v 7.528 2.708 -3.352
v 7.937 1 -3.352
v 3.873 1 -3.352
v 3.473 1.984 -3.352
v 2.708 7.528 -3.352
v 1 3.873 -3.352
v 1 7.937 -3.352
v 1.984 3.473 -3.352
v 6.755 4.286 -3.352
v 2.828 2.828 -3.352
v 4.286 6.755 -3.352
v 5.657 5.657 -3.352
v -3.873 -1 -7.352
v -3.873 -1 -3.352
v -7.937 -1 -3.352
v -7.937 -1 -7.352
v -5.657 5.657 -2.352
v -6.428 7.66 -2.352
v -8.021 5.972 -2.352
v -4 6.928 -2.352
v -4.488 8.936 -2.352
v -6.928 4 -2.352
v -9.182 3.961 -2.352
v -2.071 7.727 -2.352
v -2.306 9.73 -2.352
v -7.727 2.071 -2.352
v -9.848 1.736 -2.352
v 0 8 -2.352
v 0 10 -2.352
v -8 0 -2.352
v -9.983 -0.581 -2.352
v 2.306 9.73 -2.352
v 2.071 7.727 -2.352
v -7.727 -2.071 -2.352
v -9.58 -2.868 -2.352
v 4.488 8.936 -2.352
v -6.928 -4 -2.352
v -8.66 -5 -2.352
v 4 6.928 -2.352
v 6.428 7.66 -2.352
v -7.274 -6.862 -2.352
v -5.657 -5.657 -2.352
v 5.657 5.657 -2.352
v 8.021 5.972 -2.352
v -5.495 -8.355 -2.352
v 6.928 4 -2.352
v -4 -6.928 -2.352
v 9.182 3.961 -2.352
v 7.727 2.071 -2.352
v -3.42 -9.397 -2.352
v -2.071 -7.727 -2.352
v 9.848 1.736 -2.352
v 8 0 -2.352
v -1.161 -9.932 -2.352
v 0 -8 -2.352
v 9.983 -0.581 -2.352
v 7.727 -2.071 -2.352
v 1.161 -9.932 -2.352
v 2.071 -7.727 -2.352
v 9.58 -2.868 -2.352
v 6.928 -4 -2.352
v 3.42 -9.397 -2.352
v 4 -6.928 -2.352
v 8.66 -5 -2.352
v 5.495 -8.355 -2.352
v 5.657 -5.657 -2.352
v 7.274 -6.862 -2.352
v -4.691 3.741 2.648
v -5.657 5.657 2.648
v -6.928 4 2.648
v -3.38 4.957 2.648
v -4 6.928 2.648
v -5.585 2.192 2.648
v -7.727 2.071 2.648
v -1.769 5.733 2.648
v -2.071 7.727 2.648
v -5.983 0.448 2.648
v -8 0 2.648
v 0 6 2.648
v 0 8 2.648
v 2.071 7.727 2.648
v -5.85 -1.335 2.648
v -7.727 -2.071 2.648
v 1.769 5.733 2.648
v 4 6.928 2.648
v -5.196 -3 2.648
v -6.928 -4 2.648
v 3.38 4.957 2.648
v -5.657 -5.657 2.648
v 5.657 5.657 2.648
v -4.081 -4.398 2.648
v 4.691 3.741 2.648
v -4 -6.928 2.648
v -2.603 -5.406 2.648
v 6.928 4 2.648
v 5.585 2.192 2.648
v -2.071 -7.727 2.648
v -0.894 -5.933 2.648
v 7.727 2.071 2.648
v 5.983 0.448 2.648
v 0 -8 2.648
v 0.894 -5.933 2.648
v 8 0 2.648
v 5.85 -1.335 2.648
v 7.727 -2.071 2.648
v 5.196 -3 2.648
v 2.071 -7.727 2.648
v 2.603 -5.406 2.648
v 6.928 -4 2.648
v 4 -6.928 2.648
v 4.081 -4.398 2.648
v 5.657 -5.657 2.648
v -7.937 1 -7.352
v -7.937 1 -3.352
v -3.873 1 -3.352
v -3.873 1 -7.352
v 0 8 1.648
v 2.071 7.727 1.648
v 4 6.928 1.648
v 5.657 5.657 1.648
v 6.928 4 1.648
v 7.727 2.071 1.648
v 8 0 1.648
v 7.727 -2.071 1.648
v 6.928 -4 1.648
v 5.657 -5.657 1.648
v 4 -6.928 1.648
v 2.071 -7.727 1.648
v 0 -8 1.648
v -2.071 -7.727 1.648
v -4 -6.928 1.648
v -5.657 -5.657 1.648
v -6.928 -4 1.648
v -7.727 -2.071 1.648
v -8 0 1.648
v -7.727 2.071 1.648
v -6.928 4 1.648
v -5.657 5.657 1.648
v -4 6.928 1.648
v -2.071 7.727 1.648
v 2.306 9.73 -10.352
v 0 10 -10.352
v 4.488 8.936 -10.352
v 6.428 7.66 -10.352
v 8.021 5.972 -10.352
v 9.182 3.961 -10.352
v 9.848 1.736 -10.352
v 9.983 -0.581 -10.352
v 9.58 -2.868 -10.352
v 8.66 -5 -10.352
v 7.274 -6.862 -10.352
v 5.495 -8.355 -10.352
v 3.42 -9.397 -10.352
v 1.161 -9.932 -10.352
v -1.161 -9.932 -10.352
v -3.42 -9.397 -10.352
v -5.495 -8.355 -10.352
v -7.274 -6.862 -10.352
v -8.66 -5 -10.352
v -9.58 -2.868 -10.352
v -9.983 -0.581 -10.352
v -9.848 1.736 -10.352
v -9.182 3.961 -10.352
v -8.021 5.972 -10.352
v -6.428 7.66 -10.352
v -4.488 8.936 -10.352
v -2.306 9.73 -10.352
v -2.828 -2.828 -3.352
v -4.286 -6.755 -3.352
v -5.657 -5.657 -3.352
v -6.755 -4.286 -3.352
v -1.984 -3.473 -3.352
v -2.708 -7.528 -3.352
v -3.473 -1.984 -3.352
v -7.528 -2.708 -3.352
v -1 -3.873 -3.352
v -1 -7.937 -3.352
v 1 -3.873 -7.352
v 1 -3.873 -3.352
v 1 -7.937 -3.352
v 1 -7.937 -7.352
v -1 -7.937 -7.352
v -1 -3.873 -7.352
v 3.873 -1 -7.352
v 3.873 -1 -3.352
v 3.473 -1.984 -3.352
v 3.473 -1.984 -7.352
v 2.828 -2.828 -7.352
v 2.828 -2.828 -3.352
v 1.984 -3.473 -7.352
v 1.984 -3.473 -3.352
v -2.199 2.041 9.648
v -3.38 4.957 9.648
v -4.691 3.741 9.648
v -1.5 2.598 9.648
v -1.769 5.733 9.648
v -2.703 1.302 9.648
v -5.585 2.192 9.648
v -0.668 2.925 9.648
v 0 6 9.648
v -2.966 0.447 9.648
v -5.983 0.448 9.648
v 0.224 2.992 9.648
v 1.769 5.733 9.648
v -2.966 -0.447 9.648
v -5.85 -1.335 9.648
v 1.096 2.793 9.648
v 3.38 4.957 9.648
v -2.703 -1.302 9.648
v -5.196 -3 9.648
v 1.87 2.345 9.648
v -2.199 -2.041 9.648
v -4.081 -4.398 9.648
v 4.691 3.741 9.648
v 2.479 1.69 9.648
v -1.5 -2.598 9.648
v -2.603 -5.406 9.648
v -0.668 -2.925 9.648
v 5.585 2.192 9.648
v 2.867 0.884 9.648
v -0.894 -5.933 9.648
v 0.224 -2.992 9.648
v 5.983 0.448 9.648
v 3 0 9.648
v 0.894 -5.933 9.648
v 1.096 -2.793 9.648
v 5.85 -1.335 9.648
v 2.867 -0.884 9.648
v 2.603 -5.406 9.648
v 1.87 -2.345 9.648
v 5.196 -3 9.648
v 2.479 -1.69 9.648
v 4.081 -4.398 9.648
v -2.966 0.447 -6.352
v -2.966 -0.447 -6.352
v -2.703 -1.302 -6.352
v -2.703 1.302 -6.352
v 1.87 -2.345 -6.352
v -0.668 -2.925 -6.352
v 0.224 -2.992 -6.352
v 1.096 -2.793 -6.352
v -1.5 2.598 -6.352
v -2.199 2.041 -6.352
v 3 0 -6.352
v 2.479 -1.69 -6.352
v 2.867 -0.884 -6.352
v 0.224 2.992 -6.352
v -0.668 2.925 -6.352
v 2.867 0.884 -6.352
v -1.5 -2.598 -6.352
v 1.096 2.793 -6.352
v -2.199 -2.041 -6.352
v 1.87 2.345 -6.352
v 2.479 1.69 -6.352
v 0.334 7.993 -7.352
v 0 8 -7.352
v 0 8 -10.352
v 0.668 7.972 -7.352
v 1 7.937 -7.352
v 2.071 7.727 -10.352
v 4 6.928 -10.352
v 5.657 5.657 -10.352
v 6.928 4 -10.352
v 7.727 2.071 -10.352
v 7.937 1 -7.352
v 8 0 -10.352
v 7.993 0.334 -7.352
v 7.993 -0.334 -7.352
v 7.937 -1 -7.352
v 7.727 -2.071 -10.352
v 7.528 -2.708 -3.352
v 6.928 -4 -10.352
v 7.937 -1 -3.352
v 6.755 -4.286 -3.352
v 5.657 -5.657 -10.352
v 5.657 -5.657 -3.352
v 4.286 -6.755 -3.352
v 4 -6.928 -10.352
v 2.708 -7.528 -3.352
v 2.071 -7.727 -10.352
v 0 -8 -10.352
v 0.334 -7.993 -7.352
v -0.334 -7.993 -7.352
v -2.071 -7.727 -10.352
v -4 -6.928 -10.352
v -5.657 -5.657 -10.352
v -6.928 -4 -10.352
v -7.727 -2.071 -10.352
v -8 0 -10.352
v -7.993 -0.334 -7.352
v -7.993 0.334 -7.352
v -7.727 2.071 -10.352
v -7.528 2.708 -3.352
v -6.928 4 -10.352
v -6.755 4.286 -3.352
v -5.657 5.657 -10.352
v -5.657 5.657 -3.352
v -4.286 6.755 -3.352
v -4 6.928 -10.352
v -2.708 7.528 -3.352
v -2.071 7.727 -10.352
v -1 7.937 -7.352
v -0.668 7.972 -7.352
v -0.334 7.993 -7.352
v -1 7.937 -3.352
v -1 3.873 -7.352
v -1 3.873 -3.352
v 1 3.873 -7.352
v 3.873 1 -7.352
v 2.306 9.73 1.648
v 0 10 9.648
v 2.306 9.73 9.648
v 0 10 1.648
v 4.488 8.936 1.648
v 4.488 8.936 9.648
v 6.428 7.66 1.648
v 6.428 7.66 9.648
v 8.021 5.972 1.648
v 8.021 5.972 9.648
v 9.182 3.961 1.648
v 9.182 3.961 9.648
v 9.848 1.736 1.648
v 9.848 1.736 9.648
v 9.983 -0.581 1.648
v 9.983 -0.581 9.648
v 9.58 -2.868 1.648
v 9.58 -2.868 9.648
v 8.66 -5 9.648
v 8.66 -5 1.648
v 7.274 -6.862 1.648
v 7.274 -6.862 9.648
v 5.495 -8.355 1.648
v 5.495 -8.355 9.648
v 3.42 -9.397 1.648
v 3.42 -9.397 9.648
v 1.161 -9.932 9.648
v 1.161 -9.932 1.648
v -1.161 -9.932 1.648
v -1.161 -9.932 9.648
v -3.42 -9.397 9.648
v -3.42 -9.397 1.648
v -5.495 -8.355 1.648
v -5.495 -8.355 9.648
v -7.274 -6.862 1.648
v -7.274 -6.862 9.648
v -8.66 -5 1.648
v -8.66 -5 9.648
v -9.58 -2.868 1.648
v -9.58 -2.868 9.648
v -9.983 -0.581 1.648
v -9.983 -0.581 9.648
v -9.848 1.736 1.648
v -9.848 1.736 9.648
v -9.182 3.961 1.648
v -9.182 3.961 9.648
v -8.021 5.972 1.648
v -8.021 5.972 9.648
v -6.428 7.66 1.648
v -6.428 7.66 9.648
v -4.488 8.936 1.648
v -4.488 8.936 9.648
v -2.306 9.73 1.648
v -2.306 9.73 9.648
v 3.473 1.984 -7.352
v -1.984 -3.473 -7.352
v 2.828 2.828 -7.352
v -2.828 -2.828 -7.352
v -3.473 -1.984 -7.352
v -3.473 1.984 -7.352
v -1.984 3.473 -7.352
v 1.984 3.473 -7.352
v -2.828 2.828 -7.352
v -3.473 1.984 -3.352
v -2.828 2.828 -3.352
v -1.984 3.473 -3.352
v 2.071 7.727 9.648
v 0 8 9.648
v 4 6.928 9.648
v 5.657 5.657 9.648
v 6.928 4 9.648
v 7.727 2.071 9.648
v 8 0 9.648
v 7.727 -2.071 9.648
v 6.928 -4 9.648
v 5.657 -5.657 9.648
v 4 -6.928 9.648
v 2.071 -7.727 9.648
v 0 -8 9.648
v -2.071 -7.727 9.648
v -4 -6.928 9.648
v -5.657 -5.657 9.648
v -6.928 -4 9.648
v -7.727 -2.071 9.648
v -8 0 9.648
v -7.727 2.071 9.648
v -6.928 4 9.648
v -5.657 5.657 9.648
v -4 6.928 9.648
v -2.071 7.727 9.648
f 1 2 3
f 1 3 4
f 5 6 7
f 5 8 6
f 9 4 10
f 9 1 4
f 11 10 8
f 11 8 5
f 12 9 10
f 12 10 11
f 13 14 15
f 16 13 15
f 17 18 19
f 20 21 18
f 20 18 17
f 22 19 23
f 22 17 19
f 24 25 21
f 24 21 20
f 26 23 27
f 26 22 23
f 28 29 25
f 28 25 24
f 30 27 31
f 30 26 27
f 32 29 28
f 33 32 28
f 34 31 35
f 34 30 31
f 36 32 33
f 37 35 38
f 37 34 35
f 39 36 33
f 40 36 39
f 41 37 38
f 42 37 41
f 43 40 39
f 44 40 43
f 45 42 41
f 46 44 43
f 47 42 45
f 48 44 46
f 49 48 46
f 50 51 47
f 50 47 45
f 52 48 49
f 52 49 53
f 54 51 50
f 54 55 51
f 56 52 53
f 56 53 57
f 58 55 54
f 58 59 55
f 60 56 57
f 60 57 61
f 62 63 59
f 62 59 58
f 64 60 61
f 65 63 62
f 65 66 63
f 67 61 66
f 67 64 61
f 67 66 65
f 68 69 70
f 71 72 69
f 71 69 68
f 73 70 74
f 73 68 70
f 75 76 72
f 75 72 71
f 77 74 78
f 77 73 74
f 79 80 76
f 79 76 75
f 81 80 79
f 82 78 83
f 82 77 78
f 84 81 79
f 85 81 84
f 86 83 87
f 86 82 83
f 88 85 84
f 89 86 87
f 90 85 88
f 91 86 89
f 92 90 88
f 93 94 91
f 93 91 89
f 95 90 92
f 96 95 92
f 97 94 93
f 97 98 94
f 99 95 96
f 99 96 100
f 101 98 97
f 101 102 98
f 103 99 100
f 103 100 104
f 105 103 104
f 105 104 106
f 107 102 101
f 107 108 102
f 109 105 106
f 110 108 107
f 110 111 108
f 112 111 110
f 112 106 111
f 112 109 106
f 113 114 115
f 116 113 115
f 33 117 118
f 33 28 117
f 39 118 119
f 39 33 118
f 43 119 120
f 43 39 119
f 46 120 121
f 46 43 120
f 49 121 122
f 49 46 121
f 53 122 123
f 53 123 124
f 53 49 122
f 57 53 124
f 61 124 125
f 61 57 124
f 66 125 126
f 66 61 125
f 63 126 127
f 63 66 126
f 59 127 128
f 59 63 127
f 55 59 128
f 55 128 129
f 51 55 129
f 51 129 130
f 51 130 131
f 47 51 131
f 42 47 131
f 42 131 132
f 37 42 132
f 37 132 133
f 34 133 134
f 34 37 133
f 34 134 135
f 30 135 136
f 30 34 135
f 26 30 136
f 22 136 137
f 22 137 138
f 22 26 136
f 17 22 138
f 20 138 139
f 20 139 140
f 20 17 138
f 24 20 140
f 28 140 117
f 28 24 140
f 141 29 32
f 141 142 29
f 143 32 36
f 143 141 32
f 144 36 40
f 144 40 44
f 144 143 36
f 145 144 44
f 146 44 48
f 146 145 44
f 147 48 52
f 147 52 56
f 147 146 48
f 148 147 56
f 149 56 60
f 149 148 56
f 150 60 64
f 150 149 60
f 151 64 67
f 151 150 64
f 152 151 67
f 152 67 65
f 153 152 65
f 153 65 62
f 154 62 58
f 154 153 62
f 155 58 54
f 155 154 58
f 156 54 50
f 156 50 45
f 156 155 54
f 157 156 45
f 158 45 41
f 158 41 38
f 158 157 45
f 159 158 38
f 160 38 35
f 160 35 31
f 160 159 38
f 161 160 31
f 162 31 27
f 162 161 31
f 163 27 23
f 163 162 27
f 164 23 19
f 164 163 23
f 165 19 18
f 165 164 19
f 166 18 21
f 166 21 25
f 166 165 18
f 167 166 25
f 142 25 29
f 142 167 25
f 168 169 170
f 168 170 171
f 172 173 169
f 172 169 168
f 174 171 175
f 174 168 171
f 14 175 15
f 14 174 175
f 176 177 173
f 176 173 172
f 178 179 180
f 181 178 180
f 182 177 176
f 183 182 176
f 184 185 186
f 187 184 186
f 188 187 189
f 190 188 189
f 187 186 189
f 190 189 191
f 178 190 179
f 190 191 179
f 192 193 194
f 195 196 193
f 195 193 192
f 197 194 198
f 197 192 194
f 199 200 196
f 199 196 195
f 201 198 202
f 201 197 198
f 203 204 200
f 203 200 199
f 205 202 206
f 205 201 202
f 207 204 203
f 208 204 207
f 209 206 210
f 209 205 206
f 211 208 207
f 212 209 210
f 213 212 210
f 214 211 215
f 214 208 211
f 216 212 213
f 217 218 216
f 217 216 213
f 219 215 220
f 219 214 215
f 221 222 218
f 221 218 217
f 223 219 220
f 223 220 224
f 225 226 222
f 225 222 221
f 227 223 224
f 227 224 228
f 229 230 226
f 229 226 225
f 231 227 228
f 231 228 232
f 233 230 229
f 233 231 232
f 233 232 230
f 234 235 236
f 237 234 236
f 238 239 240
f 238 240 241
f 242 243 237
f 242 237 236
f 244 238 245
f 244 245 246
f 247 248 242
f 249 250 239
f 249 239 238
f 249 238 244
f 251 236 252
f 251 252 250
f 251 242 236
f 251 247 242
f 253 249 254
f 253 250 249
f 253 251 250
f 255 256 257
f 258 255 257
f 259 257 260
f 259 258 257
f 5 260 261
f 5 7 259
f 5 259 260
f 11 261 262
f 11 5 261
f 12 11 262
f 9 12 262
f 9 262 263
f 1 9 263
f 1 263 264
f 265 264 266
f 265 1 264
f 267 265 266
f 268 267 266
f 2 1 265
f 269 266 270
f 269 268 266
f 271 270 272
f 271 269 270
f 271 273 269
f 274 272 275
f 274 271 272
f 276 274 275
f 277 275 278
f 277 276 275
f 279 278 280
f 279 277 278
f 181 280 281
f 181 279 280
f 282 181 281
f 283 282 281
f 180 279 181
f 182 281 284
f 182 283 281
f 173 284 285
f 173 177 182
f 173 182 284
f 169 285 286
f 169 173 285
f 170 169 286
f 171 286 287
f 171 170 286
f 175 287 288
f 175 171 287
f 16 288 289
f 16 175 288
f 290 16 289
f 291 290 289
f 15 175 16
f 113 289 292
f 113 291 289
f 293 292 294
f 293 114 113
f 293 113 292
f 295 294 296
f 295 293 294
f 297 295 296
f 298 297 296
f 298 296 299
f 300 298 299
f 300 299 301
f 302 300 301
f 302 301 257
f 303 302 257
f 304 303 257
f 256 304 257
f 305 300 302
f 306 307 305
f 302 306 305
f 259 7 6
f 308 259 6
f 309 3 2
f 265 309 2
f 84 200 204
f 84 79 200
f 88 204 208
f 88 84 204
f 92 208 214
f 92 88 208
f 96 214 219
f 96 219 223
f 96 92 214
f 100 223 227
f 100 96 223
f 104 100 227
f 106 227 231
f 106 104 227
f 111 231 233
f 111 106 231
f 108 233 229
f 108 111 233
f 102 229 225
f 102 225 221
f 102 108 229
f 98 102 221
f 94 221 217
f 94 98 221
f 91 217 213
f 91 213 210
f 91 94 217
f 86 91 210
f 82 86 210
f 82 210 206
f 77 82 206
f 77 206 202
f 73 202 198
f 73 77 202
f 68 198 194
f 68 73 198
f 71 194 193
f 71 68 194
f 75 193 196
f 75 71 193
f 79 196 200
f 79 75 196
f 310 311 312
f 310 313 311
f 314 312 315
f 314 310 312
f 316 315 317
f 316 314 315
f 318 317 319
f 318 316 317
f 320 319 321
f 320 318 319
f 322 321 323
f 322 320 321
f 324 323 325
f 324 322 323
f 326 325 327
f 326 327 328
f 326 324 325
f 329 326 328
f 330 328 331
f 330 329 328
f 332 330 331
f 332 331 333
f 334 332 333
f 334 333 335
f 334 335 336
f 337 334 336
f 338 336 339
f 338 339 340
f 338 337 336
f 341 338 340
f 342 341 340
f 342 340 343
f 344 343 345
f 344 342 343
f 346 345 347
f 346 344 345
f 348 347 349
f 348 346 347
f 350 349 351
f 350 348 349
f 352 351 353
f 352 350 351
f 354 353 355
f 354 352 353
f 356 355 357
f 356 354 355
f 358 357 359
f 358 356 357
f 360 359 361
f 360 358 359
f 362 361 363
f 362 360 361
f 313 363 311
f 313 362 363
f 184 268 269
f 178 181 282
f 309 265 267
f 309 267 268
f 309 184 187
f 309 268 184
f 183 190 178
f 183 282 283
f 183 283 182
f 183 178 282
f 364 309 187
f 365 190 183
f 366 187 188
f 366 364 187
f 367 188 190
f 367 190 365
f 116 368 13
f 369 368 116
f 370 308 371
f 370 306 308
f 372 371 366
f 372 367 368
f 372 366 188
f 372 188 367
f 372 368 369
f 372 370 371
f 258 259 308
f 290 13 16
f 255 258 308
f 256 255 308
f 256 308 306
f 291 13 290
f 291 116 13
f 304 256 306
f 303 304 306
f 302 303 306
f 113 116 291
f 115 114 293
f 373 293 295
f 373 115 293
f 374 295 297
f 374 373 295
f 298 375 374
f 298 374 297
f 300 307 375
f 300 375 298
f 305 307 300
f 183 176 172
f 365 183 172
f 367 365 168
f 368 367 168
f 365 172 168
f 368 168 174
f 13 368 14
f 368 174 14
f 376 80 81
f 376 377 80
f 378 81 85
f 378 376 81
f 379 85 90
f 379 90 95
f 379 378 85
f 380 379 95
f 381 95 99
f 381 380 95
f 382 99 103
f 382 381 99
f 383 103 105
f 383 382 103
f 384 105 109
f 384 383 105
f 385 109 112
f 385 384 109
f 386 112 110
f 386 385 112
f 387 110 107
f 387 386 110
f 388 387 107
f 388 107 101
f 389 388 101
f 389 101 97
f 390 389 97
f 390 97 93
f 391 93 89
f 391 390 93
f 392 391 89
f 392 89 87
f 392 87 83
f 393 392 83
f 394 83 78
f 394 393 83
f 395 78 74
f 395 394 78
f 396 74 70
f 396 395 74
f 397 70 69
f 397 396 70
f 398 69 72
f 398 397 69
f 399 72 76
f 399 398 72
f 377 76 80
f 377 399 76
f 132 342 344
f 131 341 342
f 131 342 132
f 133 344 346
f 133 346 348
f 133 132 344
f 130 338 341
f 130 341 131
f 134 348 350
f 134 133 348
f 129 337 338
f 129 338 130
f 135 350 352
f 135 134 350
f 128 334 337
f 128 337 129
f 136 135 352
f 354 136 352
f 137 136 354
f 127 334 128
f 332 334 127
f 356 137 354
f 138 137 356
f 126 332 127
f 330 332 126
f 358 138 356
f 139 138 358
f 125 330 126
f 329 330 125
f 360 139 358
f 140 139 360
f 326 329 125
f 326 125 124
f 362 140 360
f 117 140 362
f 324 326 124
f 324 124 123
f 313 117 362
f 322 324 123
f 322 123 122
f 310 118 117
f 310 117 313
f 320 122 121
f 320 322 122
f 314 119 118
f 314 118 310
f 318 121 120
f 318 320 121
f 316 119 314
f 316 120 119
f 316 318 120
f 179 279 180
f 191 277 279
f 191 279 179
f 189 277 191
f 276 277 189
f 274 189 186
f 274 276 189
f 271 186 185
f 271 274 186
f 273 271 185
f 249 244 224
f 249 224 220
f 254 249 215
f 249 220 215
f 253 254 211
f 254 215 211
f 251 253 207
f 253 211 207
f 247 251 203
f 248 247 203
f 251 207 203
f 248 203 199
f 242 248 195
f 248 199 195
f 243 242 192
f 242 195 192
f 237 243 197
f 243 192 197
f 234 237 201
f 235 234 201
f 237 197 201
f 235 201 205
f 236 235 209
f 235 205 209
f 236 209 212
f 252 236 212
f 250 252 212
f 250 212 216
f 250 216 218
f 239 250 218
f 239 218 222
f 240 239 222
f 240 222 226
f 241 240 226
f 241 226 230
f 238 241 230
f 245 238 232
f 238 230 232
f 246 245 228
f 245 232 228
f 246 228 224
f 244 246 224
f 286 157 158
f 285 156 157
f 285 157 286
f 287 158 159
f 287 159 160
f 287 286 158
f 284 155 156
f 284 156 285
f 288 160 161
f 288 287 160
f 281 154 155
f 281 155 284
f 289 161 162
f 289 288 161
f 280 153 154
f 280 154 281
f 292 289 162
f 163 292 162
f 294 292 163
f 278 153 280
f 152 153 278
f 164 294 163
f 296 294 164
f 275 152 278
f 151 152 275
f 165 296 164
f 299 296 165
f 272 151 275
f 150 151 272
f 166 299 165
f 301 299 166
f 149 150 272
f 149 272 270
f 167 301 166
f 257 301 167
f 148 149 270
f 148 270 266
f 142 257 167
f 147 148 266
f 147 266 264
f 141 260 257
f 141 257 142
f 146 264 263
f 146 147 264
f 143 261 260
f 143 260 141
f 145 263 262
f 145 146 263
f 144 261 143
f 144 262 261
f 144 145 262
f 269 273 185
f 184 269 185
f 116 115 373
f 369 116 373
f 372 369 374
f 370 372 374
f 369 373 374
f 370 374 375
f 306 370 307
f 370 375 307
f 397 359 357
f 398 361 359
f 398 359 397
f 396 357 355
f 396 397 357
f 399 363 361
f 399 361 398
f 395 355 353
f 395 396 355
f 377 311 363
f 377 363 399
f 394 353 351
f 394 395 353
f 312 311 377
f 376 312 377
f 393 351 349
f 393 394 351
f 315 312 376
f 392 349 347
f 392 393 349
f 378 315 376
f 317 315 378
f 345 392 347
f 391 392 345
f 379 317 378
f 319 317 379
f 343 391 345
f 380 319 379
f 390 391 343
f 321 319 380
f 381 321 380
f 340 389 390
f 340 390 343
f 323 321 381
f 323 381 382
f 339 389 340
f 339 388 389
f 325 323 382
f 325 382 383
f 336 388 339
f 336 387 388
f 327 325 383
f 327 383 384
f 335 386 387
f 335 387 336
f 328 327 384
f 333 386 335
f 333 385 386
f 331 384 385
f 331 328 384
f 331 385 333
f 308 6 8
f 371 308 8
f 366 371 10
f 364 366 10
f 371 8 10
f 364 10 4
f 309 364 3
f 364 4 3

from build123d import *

# Parameters (mm, degrees)
BOSS_EXTRUDE1_DEPTH = 2
SKETCH4_R           = 1.5
CUT_EXTRUDE1_DEPTH  = 8
SCALE1_SCALE        = 2


with BuildPart() as part:
    # Sketch2 → Revolve1 (revolve)
    with BuildSketch(Plane(origin=(0, 0, 0), x_dir=(0, 0, -1), z_dir=(1, 0, 0))):
        Polygon((0, 0), (-5, 0), (-5, 3), (-1.5, 3), (-1.5, 4), (-5, 4), (-5, 5), (-1, 5), (-1, 4), (1, 4), (1, 5), (5, 5), (5, 4), (1.5, 4), (1.5, 0), align=None)
    revolve(axis=Axis((0, 0, 7.547271319), (0, 0, -1)))

    # Sketch3 → Boss-Extrude1 (add)
    with BuildSketch(Plane(origin=(0, 0, -1.5), x_dir=(-1, 0, 0), z_dir=(0, 0, -1))):
        with BuildLine():
            Line((0.5, 1.936491673), (0.5, 3.968626967))
            ThreePointArc((0.5, 3.968626967), (0, 4), (-0.5, 3.968626967))
            Line((-0.5, 3.968626967), (-0.5, 1.936491673))
            ThreePointArc((-0.5, 1.936491673), (-1.414213562, 1.414213562), (-1.936491673, 0.5))
            Line((-1.936491673, 0.5), (-3.968626967, 0.5))
            ThreePointArc((-3.968626967, 0.5), (-4, 0), (-3.968626967, -0.5))
            Line((-3.968626967, -0.5), (-1.936491673, -0.5))
            ThreePointArc((-1.936491673, -0.5), (-1.414213562, -1.414213562), (-0.5, -1.936491673))
            Line((-0.5, -1.936491673), (-0.5, -3.968626967))
            ThreePointArc((-0.5, -3.968626967), (0, -4), (0.5, -3.968626967))
            Line((0.5, -3.968626967), (0.5, -1.936491673))
            ThreePointArc((0.5, -1.936491673), (1.414213562, -1.414213562), (1.936491673, -0.5))
            Line((1.936491673, -0.5), (3.968626967, -0.5))
            ThreePointArc((3.968626967, -0.5), (4, 0), (3.968626967, 0.5))
            Line((3.968626967, 0.5), (1.936491673, 0.5))
            ThreePointArc((1.936491673, 0.5), (1.414213562, 1.414213562), (0.5, 1.936491673))
        make_face()
    extrude(amount=BOSS_EXTRUDE1_DEPTH)

    # Sketch4 → Cut-Extrude1 (cut)
    with BuildSketch(Plane.XY.offset(5)):
        Circle(SKETCH4_R)
    extrude(amount=-CUT_EXTRUDE1_DEPTH, mode=Mode.SUBTRACT)


with BuildPart() as part_1:
    # Scale1: scaled about (0, 0, 0.351761007)
    add(part.part.scale(SCALE1_SCALE).moved(Location((0, 0, -0.351761007))))


solid = part_1.part
